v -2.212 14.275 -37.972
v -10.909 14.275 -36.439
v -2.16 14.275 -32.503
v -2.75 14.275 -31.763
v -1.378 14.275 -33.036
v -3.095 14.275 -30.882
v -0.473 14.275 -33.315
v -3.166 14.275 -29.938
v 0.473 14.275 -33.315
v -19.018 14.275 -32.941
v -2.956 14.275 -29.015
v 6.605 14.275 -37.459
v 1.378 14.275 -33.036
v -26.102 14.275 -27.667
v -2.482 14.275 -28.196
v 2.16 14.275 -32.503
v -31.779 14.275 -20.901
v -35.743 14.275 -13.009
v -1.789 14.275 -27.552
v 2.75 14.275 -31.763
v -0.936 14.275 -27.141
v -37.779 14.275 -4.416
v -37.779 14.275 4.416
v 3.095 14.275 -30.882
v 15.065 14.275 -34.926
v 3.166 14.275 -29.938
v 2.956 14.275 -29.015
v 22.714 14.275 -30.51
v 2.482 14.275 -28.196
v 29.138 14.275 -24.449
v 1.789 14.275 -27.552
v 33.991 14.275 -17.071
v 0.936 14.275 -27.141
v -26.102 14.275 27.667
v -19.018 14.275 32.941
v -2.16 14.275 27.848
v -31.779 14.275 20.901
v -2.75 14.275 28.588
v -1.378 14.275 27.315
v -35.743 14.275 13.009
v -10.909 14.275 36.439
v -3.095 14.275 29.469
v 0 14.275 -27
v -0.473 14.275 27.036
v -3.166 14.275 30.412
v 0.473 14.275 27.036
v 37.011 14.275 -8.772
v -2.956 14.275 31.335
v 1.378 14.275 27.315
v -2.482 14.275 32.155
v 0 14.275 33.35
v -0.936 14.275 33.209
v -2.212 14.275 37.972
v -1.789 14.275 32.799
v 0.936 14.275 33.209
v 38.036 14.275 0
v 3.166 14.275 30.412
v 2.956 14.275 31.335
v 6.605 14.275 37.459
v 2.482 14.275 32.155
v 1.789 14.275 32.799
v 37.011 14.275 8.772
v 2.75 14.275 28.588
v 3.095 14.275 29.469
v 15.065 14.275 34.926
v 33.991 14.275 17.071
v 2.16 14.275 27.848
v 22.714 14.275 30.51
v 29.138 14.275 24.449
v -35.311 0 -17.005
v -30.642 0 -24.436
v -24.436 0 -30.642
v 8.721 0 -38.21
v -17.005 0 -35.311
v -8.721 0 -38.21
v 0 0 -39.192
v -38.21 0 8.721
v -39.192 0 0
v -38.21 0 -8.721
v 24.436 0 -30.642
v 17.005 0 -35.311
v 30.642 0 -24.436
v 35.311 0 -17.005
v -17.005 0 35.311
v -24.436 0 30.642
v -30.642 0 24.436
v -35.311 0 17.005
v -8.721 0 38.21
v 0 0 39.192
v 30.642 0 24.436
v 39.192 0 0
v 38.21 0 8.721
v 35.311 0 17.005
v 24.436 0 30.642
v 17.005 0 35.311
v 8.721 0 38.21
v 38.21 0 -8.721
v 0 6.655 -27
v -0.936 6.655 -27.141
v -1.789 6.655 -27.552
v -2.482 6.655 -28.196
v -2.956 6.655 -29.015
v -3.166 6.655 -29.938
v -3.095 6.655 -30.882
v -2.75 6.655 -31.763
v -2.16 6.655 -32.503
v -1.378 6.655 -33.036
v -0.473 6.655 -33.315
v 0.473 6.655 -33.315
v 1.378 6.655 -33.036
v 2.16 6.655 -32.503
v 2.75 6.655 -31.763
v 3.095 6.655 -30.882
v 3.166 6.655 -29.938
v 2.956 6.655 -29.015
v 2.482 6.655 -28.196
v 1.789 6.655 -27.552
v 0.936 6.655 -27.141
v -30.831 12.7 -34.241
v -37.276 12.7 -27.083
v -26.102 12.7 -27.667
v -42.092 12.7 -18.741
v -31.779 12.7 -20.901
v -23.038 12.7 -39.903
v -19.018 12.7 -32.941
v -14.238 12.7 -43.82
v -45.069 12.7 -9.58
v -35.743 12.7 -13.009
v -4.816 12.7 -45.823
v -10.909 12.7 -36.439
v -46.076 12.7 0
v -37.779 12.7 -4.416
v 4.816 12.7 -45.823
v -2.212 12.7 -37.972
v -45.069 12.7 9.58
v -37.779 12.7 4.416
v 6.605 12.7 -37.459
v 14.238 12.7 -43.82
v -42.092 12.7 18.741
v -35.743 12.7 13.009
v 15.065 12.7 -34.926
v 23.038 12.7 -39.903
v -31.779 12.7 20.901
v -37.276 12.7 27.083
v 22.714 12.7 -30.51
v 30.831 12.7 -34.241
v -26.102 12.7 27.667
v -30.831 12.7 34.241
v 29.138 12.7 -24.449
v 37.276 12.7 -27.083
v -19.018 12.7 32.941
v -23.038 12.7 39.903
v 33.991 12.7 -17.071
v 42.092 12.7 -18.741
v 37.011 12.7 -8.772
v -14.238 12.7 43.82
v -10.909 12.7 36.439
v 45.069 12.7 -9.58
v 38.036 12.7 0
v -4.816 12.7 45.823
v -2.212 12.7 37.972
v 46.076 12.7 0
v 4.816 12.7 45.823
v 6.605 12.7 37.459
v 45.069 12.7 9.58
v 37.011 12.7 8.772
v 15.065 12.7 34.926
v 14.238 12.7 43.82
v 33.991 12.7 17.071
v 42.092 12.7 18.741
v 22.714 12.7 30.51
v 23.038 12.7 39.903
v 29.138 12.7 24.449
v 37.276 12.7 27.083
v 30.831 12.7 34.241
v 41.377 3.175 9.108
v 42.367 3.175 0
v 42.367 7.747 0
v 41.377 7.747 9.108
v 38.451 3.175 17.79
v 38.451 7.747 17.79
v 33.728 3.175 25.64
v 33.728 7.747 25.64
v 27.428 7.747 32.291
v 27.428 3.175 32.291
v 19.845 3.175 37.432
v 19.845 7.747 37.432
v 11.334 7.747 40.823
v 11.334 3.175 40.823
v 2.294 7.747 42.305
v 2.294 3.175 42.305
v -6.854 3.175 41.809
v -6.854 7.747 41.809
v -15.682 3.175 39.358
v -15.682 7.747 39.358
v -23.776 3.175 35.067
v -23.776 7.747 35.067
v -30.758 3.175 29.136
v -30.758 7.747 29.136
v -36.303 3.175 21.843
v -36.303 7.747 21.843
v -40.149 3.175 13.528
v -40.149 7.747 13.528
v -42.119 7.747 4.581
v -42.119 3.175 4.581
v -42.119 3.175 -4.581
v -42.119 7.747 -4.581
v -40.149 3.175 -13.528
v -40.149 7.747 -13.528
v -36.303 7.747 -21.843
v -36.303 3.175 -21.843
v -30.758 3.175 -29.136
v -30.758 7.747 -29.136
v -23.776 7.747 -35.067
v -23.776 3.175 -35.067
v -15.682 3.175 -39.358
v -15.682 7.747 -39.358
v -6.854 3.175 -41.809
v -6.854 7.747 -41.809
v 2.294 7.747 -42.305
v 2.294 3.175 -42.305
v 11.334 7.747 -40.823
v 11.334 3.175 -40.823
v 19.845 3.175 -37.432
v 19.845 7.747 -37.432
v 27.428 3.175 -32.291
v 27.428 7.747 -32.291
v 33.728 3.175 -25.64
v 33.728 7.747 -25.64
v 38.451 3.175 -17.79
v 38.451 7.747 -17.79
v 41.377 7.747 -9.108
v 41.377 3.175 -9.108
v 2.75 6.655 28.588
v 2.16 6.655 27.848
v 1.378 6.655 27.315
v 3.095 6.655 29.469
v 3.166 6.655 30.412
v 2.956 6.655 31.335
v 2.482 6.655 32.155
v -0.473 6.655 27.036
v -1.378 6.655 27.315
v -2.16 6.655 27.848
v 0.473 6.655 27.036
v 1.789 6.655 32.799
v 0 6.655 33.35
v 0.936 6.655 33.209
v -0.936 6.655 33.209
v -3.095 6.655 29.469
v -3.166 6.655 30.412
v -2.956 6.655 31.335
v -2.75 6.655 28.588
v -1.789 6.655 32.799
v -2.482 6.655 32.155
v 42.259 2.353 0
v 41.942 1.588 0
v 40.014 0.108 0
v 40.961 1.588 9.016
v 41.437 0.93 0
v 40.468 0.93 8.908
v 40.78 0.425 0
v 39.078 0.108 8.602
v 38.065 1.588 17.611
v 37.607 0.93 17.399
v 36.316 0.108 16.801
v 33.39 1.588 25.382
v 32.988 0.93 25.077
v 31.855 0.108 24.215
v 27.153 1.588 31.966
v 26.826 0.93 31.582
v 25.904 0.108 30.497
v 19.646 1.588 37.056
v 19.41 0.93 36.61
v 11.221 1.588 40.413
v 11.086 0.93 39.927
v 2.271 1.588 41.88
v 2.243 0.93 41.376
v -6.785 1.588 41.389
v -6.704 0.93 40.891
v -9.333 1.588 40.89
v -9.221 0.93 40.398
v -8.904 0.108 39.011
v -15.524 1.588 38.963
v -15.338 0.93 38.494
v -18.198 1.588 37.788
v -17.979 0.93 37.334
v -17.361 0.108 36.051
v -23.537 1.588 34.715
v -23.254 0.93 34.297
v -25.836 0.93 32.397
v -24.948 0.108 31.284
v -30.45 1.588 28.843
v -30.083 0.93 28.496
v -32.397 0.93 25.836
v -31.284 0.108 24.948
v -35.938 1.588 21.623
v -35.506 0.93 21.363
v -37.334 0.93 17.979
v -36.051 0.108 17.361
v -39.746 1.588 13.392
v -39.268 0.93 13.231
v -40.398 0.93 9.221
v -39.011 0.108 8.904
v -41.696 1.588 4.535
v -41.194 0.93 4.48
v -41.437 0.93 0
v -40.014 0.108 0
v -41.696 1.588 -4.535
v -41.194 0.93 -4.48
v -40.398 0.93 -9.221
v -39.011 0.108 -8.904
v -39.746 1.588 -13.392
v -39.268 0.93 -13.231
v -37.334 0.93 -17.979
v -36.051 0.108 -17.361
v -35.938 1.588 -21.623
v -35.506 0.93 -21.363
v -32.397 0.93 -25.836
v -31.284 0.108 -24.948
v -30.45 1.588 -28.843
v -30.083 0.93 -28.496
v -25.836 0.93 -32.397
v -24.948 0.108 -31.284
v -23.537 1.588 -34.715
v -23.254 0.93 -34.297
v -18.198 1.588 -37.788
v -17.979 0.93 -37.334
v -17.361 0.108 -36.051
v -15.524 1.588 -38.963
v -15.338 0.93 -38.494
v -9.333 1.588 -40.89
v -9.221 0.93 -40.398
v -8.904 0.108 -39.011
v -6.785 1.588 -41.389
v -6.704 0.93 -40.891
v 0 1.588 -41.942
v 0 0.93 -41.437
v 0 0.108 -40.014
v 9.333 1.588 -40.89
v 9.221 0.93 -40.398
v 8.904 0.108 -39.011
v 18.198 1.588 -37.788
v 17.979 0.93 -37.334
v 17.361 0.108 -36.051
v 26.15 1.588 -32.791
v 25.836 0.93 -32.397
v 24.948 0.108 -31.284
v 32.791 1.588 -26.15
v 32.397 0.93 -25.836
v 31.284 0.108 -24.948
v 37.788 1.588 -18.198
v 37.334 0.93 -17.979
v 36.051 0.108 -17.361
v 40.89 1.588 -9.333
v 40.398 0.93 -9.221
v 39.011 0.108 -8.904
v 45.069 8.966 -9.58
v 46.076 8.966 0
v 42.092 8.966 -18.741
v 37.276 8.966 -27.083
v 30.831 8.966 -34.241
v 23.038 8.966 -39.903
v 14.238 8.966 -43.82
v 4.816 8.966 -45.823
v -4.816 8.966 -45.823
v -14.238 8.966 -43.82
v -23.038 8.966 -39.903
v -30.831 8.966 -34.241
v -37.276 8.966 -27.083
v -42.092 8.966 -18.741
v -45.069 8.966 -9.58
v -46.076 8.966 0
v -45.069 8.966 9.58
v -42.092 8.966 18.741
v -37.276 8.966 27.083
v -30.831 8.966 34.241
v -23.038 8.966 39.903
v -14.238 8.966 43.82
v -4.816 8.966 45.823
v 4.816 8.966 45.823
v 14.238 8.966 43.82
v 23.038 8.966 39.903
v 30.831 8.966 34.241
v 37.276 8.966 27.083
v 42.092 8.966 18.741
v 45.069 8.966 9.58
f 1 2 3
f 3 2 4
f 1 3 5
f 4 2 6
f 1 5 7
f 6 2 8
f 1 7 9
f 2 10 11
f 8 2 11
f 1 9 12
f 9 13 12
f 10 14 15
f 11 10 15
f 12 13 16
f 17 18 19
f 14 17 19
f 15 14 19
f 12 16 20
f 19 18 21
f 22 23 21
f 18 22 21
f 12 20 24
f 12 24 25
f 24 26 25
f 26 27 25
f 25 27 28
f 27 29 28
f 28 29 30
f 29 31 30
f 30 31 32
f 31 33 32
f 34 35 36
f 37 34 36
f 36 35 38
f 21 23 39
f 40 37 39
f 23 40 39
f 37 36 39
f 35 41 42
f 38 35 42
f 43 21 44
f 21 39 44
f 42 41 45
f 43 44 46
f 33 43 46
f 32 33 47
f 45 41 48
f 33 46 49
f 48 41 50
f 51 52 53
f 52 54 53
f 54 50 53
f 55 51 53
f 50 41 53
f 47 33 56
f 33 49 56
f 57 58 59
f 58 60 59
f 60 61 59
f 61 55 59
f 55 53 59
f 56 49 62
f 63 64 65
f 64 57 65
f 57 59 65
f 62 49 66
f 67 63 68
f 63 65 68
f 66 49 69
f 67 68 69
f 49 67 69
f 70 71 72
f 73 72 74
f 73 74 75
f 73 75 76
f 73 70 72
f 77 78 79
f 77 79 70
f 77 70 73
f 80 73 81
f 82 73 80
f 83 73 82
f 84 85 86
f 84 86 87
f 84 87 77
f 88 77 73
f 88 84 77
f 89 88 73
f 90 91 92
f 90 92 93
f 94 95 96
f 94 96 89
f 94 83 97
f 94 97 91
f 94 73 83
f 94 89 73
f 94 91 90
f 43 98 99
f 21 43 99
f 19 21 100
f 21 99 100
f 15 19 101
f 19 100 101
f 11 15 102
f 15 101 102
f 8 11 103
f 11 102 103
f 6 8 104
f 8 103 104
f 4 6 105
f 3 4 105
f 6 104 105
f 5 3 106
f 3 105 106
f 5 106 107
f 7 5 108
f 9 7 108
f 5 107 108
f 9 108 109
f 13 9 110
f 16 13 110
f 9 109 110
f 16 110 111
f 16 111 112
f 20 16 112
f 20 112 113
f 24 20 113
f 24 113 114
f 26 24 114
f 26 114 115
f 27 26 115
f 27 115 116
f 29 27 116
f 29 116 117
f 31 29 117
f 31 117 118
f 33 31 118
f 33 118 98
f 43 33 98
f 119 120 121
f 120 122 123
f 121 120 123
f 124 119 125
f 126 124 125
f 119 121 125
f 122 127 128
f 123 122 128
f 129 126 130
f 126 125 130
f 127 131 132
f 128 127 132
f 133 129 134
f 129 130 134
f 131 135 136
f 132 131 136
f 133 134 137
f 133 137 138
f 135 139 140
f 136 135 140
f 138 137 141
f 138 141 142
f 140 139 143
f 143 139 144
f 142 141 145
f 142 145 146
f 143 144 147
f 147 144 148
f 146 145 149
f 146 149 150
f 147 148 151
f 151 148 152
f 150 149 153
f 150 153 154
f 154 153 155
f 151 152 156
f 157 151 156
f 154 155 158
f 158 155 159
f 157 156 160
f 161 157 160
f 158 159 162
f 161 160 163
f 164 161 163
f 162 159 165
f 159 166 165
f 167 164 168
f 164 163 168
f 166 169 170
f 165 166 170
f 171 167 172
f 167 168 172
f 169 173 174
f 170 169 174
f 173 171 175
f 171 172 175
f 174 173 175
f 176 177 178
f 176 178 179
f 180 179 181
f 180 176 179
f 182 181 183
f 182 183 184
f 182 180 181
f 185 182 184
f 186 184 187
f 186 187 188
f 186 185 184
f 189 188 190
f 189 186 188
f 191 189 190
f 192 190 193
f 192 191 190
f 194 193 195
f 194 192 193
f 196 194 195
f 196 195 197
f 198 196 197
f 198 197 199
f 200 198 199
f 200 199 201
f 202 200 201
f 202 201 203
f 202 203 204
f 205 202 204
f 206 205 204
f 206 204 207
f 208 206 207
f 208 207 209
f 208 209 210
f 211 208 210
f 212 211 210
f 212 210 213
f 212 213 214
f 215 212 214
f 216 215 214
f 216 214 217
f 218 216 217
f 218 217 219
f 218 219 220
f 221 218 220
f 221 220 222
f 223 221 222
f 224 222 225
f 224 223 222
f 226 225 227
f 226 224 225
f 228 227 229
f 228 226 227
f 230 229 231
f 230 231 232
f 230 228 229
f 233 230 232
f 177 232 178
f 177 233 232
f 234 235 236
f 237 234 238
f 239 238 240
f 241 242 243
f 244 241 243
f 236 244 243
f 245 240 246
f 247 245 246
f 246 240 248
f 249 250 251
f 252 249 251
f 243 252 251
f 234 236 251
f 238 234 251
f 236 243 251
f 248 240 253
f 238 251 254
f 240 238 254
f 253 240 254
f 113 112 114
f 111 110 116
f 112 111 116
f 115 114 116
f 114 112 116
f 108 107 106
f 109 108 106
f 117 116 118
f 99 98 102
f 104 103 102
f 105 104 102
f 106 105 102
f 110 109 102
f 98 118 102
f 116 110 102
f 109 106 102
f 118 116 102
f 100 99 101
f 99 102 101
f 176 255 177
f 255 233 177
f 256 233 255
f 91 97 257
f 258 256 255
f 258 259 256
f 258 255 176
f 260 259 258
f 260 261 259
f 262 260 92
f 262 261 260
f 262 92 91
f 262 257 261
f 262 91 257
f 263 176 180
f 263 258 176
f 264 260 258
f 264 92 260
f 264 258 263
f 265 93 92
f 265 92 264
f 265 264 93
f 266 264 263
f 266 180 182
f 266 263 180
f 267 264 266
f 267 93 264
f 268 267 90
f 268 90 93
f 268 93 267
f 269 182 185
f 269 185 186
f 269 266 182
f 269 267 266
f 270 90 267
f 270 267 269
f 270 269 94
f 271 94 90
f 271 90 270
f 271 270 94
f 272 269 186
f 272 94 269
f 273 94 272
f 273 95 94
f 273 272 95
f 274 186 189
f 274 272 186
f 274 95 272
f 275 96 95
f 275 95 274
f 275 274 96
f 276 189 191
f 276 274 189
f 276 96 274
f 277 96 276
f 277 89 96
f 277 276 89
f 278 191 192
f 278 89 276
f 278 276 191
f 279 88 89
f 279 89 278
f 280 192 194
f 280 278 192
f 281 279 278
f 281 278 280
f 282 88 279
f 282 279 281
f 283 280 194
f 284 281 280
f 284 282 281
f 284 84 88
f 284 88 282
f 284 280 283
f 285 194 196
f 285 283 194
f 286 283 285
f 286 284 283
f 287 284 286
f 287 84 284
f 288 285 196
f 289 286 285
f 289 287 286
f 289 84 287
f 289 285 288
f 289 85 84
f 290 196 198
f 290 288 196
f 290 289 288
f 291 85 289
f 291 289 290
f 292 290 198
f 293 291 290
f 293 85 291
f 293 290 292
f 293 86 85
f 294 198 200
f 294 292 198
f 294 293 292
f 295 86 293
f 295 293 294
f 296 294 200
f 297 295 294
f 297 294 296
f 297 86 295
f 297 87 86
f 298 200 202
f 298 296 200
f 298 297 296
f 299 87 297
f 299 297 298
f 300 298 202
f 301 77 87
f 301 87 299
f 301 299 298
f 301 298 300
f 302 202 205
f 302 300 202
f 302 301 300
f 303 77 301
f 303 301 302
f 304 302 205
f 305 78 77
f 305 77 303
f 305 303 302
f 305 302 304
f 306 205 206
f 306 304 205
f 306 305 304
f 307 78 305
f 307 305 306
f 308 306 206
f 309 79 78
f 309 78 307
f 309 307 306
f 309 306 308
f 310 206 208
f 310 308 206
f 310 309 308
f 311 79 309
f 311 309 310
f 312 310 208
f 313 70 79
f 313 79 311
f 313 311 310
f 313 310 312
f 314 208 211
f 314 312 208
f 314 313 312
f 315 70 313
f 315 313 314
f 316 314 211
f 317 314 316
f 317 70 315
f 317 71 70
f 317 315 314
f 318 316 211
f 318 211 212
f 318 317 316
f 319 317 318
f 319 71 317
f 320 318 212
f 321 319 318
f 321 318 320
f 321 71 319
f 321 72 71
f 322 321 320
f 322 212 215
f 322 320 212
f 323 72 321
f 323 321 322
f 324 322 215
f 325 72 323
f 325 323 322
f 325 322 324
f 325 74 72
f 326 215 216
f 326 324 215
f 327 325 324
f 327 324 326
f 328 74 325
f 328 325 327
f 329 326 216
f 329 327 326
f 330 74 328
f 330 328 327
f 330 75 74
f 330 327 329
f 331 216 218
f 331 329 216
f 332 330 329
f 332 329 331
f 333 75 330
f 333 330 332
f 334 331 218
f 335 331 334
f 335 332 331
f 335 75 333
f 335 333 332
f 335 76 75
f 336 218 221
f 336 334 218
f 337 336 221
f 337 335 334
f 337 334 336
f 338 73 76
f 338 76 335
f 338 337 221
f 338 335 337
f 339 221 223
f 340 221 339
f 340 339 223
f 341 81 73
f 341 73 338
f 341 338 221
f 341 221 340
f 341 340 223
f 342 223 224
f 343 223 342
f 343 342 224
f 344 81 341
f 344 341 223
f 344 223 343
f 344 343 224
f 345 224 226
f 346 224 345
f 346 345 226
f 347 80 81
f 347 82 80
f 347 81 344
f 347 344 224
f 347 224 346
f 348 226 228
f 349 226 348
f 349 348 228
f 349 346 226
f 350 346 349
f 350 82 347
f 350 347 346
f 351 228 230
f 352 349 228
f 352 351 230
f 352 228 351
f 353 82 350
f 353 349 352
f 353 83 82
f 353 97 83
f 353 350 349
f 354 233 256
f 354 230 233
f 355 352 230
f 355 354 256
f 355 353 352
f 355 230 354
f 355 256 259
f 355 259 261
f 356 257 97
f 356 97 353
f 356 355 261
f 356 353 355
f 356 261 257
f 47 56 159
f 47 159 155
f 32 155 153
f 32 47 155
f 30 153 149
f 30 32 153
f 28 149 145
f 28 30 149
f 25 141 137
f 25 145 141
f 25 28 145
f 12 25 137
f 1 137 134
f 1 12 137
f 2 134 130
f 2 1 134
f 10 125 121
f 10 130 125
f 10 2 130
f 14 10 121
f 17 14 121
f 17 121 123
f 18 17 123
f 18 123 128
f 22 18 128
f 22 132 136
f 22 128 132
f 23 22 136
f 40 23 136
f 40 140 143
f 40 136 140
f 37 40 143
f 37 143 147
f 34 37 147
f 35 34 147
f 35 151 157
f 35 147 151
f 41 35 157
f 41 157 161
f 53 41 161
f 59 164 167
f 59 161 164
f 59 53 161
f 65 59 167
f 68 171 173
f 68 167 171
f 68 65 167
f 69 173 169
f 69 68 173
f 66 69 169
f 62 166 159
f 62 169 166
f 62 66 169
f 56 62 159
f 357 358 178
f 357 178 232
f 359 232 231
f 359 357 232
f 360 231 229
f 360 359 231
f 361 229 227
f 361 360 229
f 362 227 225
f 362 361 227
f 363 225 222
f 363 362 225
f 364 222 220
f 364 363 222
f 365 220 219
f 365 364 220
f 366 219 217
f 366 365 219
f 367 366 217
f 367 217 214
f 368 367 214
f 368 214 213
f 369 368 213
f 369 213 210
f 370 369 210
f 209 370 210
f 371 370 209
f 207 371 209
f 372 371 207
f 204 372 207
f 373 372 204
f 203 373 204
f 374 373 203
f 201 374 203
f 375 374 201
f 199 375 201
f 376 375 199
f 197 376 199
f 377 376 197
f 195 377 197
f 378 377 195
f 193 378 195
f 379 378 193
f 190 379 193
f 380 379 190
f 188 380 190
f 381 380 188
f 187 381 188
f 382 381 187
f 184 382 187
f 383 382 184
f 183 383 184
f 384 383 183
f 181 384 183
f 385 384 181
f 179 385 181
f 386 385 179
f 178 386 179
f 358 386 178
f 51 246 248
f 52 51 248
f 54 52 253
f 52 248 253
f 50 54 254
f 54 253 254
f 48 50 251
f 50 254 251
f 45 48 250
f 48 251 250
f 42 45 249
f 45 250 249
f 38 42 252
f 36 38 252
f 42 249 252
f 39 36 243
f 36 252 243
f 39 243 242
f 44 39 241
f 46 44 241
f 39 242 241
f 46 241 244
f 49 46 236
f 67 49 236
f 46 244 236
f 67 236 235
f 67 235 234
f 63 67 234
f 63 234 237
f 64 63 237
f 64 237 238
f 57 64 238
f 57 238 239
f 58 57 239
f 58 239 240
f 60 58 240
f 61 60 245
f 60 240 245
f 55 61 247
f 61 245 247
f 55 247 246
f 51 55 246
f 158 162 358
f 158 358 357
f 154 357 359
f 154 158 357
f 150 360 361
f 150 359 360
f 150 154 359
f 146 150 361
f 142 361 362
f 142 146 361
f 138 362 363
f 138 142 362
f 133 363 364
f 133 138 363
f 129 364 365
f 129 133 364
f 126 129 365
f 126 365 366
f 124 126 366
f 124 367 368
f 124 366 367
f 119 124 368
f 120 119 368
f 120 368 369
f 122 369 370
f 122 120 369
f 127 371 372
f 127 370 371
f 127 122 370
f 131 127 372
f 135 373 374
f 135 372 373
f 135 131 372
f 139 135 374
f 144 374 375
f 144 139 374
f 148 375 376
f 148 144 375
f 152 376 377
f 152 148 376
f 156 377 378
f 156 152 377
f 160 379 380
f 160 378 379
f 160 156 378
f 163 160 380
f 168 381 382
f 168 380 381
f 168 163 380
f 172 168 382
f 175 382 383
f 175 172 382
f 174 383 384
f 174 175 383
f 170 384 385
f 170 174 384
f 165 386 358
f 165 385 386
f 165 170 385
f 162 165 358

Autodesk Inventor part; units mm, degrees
ref_plane "YZ Plane" through (0, 0, 0) normal (1, 0, 0) x (0, 1, 0)
ref_plane "XZ Plane" through (0, 0, 0) normal (0, 1, 0) x (-1, 0, 0)
ref_plane "XY Plane" through (0, 0, 0) normal (0, 0, 1) x (1, 0, 0)
sketch "Sketch1" plane through (0, 0, 0) normal (0, 0, 1) x (1, 0, 0)
  line L0 (17.5514, 0) -> (46.0756, 0)
  line L1 (46.0756, 0) -> (46.0756, 12.7)
  line L2 (46.0756, 12.7) -> (0, 12.7)
  line L3 (0, 12.7) -> (0, 0)
  line L4 (17.5514, 12.7) -> (17.5514, 0)
  line L5 (46.0756, 8.9662) -> (42.3672, 8.9662)
  line L6 (42.3672, 7.747) -> (42.3672, 0)
  line L7 (46.0756, 7.747) -> (42.3672, 7.747)
  line L8 (46.0756, 8.9662) -> (42.3672, 7.747)
  line L9 (0, 11.1252) -> (0, 12.7)
  line L10 (17.5514, 0) -> (23.85, 0)
  line L11 (0, -2.5) -> (0, 0)
  line L12 (0, 12.7) -> (38.0365, 12.7)
  line L13 (38.0365, 12.7) -> (38.0365, 14.2748)
  line L14 (38.0365, 14.2748) -> (0, 14.2748)
  line L15 (0, 14.2748) -> (0, 12.7)
  line L16 (17.5514, 12.7) -> (17.5514, 14.2748)
  line L17 (0, 0) -> (17.5514, 0)
  dimension "d1" = 12.7
  dimension "d3" = 3.7338
  dimension "d5" = 4.953
  dimension "d8" = 17.5514
  dimension "d9" = 42.3672
  dimension "d10" = 46.0756
  dimension "d11" = 1.5748
  dimension "d12" = 38.0365
revolve "Revolution1" add sketch "Sketch1" angle 360 about axis through (0, 12.7, 0) along (0, -1, 0) contours L4 L2 L1 L8 L6 L0 | L17 L3 L2 L4 | L16 L14 L13 L2 | L2 L15 L14 L16
sketch "Sketch2" plane through (0, 14.2748, 0) normal (0, 1, 0) x (1, 0, 0)
  circle A0 centre (0, 0) radius 30.1752
  point P0 (0, 30.1752)
  point P1 (0, -30.1752)
  dimension "d14" = 60.3504
hole "Hole1" at (0, 14.2748, -30.1752) at (0, 14.2748, 30.1752) direction (0, -1, 0) diameter 6.35 depth 7.62
fillet "Fillet1" radius 3.175 1 edges at (-42.3672, 0, 0)
properties part number "2016.06.09 Blank Adapter" material "Aluminum 6061"
